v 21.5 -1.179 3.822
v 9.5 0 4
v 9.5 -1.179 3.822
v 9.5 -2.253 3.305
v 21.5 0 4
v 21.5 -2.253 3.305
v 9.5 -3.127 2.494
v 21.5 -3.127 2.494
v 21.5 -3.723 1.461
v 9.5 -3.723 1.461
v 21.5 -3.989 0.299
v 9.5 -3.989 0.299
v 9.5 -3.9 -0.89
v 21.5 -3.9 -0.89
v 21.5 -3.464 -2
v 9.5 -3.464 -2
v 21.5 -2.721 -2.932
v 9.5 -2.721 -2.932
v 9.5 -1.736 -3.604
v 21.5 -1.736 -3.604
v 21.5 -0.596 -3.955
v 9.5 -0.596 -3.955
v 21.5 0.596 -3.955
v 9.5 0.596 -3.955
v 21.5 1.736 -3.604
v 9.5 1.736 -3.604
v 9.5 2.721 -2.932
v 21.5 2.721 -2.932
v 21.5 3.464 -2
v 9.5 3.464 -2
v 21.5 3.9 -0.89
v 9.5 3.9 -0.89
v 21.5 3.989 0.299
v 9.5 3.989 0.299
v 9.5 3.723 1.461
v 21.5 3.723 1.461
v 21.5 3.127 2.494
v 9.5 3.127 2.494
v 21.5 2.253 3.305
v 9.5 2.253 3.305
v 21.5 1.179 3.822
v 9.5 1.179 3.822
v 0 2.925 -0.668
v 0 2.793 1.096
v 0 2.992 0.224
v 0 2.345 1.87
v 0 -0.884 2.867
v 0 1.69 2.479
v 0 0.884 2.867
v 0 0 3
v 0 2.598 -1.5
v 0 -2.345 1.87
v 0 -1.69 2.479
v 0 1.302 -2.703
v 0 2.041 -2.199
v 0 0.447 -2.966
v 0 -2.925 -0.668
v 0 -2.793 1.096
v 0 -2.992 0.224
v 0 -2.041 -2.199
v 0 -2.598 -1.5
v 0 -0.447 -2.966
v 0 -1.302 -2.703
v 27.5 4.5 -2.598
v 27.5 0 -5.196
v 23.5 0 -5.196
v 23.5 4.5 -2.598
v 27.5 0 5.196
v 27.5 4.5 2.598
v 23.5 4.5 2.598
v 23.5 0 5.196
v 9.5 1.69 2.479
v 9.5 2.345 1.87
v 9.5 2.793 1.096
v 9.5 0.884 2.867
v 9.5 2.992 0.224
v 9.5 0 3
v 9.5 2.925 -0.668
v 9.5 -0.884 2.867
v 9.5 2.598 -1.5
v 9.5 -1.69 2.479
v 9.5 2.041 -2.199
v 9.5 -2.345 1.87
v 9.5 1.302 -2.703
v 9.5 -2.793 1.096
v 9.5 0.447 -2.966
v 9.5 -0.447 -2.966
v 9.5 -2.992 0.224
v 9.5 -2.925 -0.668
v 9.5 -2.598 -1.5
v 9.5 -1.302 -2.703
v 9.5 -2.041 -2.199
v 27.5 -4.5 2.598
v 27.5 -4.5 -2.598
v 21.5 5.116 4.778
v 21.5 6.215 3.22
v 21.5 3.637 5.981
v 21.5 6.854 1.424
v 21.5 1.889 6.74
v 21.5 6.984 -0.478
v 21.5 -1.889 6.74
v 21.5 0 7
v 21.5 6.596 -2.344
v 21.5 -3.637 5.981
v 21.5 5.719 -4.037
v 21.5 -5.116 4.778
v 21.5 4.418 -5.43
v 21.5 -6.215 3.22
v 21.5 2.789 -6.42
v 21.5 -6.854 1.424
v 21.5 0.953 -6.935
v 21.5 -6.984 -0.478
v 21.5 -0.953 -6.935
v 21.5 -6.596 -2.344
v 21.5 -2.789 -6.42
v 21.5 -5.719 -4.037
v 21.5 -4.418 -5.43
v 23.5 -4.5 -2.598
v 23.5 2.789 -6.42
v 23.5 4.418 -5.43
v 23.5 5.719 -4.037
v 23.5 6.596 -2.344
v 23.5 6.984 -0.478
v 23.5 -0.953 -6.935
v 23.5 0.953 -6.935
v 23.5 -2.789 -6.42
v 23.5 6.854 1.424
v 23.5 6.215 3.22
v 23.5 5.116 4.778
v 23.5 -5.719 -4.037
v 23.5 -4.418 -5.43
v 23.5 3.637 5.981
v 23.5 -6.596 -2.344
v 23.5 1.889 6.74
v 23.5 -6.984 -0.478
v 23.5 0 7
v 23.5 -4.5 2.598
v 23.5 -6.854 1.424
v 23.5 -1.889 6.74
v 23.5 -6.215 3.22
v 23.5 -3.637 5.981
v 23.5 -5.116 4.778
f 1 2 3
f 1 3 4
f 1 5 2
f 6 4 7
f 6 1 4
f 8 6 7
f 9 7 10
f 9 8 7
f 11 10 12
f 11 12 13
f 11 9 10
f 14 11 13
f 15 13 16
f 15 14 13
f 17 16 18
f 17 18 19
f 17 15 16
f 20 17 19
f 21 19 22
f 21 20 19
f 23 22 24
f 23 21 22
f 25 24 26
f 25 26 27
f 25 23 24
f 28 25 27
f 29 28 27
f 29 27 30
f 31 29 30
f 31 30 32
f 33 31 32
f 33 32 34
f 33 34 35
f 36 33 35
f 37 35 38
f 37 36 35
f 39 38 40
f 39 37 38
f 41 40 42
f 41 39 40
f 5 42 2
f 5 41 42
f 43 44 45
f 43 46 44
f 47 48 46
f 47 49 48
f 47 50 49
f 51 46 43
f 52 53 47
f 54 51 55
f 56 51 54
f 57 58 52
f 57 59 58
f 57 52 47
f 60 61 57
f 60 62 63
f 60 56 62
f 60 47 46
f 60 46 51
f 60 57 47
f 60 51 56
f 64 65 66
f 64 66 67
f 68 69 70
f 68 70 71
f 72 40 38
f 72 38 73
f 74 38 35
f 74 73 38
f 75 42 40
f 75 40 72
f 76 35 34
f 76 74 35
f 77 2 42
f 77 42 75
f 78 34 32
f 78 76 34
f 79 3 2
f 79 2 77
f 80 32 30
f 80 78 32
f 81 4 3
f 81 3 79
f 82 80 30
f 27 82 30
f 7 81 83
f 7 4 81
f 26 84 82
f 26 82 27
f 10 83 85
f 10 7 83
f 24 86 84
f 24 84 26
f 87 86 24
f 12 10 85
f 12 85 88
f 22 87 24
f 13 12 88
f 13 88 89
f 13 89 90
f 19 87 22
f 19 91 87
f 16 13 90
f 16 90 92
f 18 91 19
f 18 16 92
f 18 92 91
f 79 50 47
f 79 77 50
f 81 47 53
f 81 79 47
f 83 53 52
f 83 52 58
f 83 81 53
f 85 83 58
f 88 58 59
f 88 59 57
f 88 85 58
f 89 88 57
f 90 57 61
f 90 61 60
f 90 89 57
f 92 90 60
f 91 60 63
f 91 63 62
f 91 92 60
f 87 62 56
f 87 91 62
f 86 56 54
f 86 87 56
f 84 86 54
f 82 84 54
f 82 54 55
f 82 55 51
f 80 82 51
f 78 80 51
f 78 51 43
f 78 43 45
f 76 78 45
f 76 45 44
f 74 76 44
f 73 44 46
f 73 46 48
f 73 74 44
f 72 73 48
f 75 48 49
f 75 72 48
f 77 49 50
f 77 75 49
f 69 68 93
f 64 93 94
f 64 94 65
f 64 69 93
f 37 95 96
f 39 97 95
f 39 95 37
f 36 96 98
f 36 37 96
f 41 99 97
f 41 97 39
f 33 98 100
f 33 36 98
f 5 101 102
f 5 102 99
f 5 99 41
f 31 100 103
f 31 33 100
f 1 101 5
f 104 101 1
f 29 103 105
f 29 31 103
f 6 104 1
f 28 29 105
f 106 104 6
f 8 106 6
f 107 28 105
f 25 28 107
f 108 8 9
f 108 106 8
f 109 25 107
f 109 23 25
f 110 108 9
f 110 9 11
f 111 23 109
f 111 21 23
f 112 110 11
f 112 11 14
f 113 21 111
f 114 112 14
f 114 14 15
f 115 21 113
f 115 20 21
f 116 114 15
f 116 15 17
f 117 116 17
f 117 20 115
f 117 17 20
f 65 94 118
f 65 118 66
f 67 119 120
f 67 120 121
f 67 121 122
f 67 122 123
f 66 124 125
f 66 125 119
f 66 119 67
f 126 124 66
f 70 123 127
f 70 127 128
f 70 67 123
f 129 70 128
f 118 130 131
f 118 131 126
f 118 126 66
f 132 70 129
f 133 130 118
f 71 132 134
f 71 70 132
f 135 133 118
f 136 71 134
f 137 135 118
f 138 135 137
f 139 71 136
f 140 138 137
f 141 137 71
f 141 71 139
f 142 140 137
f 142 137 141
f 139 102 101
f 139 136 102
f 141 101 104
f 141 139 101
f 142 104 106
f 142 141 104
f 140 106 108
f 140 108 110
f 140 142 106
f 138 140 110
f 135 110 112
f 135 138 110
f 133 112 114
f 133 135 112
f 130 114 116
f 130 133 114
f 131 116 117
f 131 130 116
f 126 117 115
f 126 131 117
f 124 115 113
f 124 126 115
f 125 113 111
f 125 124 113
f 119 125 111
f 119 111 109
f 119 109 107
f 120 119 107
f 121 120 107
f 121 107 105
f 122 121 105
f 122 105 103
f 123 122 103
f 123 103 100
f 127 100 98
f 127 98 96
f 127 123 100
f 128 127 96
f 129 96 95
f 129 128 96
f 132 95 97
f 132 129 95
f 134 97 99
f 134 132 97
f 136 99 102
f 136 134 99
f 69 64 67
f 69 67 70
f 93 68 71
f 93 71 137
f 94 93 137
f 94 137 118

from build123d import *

# Parameters (mm, degrees)
BOSS_EXTRUDE1_DEPTH = 4


with BuildPart() as part:
    # Sketch1 → Revolve1 (revolve)
    with BuildSketch(Plane.XY, mode=Mode.PRIVATE) as revolve1_sk:
        Polygon((0, 0), (0, 3), (9.5, 3), (9.5, 4), (21.5, 4), (21.5, 7), (23.5, 7), (23.5, 4.5), (27.5, 4.5), (27.5, 0), align=None)
    revolve(revolve1_sk.sketch.rotate(Axis((0, 0, 0), (1, 0, 0)), 90), axis=Axis((0, 0, 0), (1, 0, 0)))

    # Sketch2 → Boss-Extrude1 (add)
    with BuildSketch(Plane(origin=(27.5, 0, 0), x_dir=(0, 0, -1), z_dir=(1, 0, 0))):
        Polygon((-2.598076211, 4.5), (-5.196152423, 0), (-2.598076211, -4.5), (2.598076211, -4.5), (5.196152423, 0), (2.598076211, 4.5), align=None)
    extrude(amount=-BOSS_EXTRUDE1_DEPTH)


solid = part.part
